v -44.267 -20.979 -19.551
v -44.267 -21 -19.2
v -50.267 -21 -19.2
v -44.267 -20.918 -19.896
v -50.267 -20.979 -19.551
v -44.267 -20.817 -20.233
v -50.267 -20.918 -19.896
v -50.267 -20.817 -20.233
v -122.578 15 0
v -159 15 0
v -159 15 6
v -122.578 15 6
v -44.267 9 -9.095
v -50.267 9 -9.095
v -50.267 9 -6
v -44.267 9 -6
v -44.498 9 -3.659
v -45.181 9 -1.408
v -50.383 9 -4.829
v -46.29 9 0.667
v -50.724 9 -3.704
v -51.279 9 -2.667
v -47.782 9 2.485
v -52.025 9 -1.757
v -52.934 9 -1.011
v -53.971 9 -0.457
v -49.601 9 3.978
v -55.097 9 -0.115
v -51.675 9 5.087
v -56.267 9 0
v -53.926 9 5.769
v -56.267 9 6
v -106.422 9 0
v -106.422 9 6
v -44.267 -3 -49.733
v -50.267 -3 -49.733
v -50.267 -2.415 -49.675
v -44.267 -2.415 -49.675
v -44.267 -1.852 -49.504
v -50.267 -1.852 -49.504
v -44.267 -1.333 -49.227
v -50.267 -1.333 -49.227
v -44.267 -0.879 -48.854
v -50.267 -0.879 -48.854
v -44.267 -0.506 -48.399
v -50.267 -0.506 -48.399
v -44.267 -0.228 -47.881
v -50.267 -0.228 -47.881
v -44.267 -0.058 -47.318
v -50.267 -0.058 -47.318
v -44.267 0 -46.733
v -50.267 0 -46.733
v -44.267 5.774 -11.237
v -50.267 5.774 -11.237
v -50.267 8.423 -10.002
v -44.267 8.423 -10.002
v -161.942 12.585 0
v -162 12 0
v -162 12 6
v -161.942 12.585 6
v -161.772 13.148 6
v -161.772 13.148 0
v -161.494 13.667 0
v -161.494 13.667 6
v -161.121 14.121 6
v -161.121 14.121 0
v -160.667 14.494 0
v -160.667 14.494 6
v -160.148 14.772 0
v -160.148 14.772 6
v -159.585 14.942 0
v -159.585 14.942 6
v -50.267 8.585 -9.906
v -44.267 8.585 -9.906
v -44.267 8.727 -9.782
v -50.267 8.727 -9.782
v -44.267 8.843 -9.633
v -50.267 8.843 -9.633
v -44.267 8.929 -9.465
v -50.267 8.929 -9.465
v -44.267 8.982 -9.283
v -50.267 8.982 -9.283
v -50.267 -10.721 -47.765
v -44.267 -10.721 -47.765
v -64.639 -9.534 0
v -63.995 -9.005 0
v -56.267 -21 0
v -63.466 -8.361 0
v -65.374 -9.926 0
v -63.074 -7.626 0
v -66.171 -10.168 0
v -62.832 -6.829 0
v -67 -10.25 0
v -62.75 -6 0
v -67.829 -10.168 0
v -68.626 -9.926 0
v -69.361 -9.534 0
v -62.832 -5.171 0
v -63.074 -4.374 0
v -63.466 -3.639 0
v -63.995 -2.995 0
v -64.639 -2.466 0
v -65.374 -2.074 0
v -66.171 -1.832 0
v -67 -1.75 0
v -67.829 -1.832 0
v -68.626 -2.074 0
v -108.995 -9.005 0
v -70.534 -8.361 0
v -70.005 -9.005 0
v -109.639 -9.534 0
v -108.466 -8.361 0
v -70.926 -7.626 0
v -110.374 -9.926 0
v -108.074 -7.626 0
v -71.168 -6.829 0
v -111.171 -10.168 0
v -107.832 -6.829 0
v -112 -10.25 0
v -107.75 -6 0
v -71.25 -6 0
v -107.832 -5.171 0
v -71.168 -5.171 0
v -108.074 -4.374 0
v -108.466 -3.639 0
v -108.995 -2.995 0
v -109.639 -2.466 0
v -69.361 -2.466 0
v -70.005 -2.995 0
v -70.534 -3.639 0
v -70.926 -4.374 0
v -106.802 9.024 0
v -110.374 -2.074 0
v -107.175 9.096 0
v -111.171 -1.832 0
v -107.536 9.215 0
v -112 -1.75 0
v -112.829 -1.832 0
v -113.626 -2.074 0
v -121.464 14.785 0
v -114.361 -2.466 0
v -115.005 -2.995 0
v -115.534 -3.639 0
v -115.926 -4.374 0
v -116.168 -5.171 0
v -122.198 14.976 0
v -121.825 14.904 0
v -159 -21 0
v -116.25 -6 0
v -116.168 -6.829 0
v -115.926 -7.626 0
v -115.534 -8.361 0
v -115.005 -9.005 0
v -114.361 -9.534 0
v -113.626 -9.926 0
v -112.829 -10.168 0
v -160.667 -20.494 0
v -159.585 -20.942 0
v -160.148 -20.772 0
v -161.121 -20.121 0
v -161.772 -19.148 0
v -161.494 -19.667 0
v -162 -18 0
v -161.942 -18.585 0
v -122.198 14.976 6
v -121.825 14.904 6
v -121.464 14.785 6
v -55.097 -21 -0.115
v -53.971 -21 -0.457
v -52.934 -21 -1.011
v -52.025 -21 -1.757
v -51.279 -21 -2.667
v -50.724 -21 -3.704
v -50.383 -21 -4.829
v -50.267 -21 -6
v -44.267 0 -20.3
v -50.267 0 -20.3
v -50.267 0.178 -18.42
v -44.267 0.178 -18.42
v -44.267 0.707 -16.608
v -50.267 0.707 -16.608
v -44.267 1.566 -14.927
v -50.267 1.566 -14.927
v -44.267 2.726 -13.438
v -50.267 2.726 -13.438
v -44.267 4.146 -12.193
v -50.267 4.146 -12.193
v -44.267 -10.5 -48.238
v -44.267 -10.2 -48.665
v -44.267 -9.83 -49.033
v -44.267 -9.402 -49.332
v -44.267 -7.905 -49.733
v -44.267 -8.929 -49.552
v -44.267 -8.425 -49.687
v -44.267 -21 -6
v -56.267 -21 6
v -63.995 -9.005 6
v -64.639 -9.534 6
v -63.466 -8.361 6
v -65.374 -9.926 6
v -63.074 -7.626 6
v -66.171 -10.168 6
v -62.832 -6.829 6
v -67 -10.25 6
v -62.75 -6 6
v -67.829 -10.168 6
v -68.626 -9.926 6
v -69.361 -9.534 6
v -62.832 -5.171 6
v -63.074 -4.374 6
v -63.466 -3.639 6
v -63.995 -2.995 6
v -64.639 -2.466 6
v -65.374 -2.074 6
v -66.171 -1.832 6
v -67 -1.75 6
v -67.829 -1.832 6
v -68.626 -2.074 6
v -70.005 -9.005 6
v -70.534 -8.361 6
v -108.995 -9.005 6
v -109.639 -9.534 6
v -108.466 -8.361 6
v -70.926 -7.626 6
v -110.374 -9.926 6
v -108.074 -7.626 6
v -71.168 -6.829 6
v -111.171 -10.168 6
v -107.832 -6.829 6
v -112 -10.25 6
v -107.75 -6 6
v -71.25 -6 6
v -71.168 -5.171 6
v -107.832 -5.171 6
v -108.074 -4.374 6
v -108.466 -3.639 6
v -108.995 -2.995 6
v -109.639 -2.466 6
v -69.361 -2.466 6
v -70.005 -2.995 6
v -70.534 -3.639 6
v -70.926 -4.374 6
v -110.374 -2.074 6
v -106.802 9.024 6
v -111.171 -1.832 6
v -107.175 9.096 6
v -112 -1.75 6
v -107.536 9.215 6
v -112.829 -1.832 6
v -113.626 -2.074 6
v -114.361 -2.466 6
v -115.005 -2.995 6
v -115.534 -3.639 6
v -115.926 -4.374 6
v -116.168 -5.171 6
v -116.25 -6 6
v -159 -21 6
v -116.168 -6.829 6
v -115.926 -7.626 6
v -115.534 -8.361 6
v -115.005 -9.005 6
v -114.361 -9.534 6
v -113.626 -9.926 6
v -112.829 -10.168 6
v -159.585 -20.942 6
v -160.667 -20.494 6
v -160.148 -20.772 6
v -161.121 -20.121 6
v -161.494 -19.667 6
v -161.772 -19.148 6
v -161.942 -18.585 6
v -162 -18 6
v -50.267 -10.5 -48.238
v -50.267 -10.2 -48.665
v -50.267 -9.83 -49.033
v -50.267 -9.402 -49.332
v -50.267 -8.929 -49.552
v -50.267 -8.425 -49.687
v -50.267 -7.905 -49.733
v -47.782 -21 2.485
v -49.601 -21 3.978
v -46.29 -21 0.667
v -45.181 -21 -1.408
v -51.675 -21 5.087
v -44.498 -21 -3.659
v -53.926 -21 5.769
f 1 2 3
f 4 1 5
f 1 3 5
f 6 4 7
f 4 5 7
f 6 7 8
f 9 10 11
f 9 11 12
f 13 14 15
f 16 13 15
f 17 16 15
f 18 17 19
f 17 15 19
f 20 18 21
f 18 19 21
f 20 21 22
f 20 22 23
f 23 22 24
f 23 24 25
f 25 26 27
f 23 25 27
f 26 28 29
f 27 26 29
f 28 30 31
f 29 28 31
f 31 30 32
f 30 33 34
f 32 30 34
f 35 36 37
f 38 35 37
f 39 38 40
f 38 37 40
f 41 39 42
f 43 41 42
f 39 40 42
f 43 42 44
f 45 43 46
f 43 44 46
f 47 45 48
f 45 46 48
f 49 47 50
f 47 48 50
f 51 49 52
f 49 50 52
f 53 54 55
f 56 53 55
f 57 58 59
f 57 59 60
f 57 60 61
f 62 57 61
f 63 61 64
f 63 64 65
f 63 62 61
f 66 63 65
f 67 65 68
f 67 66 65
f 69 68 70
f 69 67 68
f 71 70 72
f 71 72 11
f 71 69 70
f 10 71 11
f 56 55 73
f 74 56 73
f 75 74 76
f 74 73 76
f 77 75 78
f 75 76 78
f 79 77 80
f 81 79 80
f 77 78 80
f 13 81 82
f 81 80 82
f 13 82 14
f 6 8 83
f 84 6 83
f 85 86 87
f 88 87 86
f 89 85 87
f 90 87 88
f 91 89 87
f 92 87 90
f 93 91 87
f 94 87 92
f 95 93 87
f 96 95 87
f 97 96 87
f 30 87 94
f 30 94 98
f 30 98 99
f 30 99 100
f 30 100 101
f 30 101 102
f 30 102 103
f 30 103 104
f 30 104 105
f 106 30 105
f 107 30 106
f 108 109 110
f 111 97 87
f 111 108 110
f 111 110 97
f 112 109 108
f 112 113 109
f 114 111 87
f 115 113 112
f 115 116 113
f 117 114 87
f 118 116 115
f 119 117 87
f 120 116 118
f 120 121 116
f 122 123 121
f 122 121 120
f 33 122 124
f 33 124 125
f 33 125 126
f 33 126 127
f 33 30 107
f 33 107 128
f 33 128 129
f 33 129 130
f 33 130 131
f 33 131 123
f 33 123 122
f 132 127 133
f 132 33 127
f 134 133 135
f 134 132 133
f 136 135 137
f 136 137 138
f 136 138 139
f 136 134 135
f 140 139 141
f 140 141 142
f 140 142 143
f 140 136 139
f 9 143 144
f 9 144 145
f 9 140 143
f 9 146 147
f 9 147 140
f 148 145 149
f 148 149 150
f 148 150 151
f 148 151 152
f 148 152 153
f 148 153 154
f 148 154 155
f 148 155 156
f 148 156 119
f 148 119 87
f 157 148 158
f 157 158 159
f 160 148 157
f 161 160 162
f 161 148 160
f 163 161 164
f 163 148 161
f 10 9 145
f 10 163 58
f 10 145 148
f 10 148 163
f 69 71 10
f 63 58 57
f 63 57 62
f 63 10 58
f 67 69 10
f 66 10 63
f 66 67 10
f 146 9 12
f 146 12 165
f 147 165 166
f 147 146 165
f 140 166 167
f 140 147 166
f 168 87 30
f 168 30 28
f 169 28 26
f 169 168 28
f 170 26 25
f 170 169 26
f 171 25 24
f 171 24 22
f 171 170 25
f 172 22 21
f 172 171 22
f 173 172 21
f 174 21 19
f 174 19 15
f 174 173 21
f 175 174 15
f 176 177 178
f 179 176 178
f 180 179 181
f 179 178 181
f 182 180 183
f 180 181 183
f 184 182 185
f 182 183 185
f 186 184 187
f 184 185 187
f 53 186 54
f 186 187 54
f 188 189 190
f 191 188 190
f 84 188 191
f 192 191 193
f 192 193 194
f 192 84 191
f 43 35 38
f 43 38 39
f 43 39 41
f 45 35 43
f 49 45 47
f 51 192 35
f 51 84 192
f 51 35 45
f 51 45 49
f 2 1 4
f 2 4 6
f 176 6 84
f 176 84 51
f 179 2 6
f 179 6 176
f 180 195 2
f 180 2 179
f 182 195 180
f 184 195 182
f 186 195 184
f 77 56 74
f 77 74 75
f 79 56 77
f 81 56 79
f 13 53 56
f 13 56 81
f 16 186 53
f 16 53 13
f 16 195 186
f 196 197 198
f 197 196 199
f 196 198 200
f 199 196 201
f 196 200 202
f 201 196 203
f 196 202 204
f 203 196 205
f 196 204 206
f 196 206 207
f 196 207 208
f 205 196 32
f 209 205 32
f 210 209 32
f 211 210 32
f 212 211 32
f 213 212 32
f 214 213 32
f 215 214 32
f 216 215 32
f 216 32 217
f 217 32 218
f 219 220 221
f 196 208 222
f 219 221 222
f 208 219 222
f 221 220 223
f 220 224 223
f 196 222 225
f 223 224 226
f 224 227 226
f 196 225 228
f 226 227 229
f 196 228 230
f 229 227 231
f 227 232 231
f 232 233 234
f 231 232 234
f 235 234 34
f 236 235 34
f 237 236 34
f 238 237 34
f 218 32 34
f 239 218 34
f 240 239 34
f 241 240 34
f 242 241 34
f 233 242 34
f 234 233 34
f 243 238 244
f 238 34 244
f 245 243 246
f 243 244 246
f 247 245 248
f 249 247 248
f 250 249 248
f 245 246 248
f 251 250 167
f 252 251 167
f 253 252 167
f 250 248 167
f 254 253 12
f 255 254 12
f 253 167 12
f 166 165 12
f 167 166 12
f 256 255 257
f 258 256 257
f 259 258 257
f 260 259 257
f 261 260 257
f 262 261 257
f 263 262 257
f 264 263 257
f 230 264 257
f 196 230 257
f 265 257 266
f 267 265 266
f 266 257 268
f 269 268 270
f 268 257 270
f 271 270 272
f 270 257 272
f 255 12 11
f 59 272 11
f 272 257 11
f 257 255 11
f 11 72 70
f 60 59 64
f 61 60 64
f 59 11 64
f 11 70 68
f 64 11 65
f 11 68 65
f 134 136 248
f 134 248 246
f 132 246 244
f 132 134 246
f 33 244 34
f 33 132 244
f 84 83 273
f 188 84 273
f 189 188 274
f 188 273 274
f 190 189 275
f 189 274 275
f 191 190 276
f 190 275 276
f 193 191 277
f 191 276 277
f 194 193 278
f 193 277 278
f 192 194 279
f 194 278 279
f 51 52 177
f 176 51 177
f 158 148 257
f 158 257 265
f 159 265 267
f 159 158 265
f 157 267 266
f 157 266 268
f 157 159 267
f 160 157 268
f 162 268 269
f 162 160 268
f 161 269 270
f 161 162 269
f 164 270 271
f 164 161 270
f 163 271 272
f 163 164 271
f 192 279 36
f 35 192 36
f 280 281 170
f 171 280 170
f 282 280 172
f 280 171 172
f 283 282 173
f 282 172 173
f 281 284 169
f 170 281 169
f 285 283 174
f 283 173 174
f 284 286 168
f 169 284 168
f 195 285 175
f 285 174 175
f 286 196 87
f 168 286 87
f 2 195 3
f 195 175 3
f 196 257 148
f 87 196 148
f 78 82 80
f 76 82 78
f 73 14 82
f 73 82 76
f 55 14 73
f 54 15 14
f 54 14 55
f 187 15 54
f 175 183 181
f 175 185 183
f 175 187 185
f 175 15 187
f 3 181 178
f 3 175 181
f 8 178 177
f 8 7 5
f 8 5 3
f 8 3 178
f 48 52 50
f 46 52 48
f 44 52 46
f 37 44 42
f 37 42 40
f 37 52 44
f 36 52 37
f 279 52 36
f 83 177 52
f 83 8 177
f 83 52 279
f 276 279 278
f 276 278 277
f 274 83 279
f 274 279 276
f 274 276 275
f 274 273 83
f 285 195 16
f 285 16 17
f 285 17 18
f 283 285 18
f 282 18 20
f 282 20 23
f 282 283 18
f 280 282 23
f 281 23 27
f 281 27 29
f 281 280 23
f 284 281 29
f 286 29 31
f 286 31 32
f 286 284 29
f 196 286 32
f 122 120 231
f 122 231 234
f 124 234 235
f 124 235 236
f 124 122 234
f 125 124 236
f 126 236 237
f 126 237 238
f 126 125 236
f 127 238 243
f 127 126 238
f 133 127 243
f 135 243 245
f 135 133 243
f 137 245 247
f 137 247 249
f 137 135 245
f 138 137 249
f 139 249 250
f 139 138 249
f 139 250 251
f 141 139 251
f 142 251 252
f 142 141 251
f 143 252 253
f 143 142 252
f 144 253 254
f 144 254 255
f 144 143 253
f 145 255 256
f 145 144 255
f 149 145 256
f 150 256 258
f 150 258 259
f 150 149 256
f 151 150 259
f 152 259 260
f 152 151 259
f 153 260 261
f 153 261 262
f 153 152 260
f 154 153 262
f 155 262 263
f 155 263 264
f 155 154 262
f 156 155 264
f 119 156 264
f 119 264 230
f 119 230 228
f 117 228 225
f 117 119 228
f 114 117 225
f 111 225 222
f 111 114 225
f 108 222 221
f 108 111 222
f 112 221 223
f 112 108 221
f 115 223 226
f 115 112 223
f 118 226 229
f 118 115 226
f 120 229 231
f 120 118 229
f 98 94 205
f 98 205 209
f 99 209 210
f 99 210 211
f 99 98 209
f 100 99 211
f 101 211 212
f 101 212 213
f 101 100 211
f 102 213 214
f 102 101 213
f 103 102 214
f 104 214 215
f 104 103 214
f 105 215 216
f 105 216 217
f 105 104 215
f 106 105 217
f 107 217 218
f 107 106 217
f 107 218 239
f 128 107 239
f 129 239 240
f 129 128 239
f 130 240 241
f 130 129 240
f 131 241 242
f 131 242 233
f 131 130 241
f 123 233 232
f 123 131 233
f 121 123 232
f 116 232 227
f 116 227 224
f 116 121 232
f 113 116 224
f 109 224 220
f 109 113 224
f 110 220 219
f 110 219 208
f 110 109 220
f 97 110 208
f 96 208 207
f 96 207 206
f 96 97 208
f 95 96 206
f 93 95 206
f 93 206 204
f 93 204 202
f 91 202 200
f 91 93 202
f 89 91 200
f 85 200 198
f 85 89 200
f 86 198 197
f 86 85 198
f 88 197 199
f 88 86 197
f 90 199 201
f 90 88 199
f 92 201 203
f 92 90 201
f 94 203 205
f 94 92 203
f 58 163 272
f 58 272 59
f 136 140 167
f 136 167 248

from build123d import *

# Parameters (mm, degrees)
SKETCH1_R                = 4.25
EXTRUDE1_DEPTH           = 6
PROCESS_BENDS1_START     = -45.500357344
PROCESS_BENDS1_OUTLINE_W = 30
PROCESS_BENDS1_OUTLINE_H = 6
PROCESS_BENDS1_DEPTH     = 45.500357344
PROCESS_BENDS1_START_2   = -50.267477344
PROCESS_BENDS1_2_DEPTH   = 4.83288
PROCESS_BENDS1_START_3   = -56.267477344
PROCESS_BENDS1_3_DEPTH   = 6
PROCESS_BENDS1_START_4   = -45.434597344
PROCESS_BENDS1_4_DEPTH   = 1.16712
PROCESS_BENDS1_START_5   = -21
PROCESS_BENDS1_5_DEPTH   = 30


with BuildPart() as part:
    # Sketch1 → Extrude1 (new body)
    with BuildSketch(Plane.XY):
        with BuildLine():
            Line((-106.422252789, 9), (-40.637070261, 9))
            ThreePointArc((-40.637070261, 9), (-40.099770652, 8.843391446), (-39.730762474, 8.422618262))
            Line((-39.730762474, 8.422618262), (-38.495606339, 5.773817383))
            ThreePointArc((-38.495606339, 5.773817383), (-34.805524552, 1.566085542), (-29.432528469, 0))
            Line((-29.432528469, 0), (-3, 0))
            ThreePointArc((-3, 0), (-0.878679656, -0.878679656), (0, -3))
            Line((0, -3), (0, -7.904690938))
            ThreePointArc((0, -7.904690938), (-0.540498847, -9.622495956), (-1.967236053, -10.721319886))
            Line((-1.967236053, -10.721319886), (-29.49989713, -20.816628948))
            ThreePointArc((-29.49989713, -20.816628948), (-30.008202711, -20.95380152), (-30.532661077, -21))
            Line((-30.532661077, -21), (-159, -21))
            ThreePointArc((-159, -21), (-161.121320344, -20.121320344), (-162, -18))
            Line((-162, -18), (-162, 12))
            ThreePointArc((-162, 12), (-161.121320344, 14.121320344), (-159, 15))
            Line((-159, 15), (-122.577747211, 15))
            ThreePointArc((-122.577747211, 15), (-122.010424647, 14.94586916), (-121.463575182, 14.785430073))
            Line((-121.463575182, 14.785430073), (-107.536424818, 9.214569927))
            ThreePointArc((-107.536424818, 9.214569927), (-106.989575353, 9.05413084), (-106.422252789, 9))
        make_face()
        with Locations((-67, -6)):
            Circle(SKETCH1_R, mode=Mode.SUBTRACT)
        with Locations((-112, -6)):
            Circle(SKETCH1_R, mode=Mode.SUBTRACT)
    extrude(amount=EXTRUDE1_DEPTH)

    # Process-Bends1: read off the stored shape, not the designer's step
    # Process-Bends1 outline → Process-Bends1 (cut)
    with BuildSketch(Plane.YZ.offset(PROCESS_BENDS1_START)):
        with Locations((-6, 3)):
            Rectangle(PROCESS_BENDS1_OUTLINE_W, PROCESS_BENDS1_OUTLINE_H)
    extrude(amount=PROCESS_BENDS1_DEPTH, mode=Mode.SUBTRACT)

    # Process-Bends1 2 outline → Process-Bends1 2 (add)
    with BuildSketch(Plane.YZ.offset(PROCESS_BENDS1_START_2)):
        with BuildLine():
            Line((5.773817383, -11.236916317), (8.422618262, -10.001760182))
            ThreePointArc((8.422618262, -10.001760182), (8.843391446, -9.632752004), (9, -9.095452395))
            Line((9, -9.095452395), (9, 0))
            Line((9, 0), (-21, 0))
            Line((-21, 0), (-21, -19.199861579))
            ThreePointArc((-21, -19.199861579), (-20.95380152, -19.724319945), (-20.816628948, -20.232625526))
            Line((-20.816628948, -20.232625526), (-10.721319886, -47.765286604))
            ThreePointArc((-10.721319886, -47.765286604), (-9.622495956, -49.192023809), (-7.904690938, -49.732522656))
            Line((-7.904690938, -49.732522656), (-3, -49.732522656))
            ThreePointArc((-3, -49.732522656), (-0.878679656, -48.853843), (0, -46.732522656))
            Line((0, -46.732522656), (0, -20.299994188))
            ThreePointArc((0, -20.299994188), (1.566085542, -14.926998104), (5.773817383, -11.236916317))
        make_face()
    extrude(amount=PROCESS_BENDS1_2_DEPTH)

    # Process-Bends1 3 outline → Process-Bends1 3 (add)
    with BuildSketch(Plane.YZ.offset(PROCESS_BENDS1_START_3)):
        with BuildLine():
            Line((5.773817383, -11.236916317), (8.422618262, -10.001760182))
            ThreePointArc((8.422618262, -10.001760182), (8.843391446, -9.632752004), (9, -9.095452395))
            Line((9, -9.095452395), (9, 0))
            Line((9, 0), (-21, 0))
            Line((-21, 0), (-21, -19.199861579))
            ThreePointArc((-21, -19.199861579), (-20.95380152, -19.724319945), (-20.816628948, -20.232625526))
            Line((-20.816628948, -20.232625526), (-10.721319886, -47.765286604))
            ThreePointArc((-10.721319886, -47.765286604), (-9.622495956, -49.192023809), (-7.904690938, -49.732522656))
            Line((-7.904690938, -49.732522656), (-3, -49.732522656))
            ThreePointArc((-3, -49.732522656), (-0.878679656, -48.853843), (0, -46.732522656))
            Line((0, -46.732522656), (0, -20.299994188))
            ThreePointArc((0, -20.299994188), (1.566085542, -14.926998104), (5.773817383, -11.236916317))
        make_face()
    extrude(amount=PROCESS_BENDS1_3_DEPTH)

    # Process-Bends1 4 outline → Process-Bends1 4 (add)
    with BuildSketch(Plane.YZ.offset(PROCESS_BENDS1_START_4)):
        with BuildLine():
            Line((5.773817383, -11.236916317), (8.422618262, -10.001760182))
            ThreePointArc((8.422618262, -10.001760182), (8.843391446, -9.632752004), (9, -9.095452395))
            Line((9, -9.095452395), (9, 0))
            Line((9, 0), (-21, 0))
            Line((-21, 0), (-21, -19.199861579))
            ThreePointArc((-21, -19.199861579), (-20.95380152, -19.724319945), (-20.816628948, -20.232625526))
            Line((-20.816628948, -20.232625526), (-10.721319886, -47.765286604))
            ThreePointArc((-10.721319886, -47.765286604), (-9.622495956, -49.192023809), (-7.904690938, -49.732522656))
            Line((-7.904690938, -49.732522656), (-3, -49.732522656))
            ThreePointArc((-3, -49.732522656), (-0.878679656, -48.853843), (0, -46.732522656))
            Line((0, -46.732522656), (0, -20.299994188))
            ThreePointArc((0, -20.299994188), (1.566085542, -14.926998104), (5.773817383, -11.236916317))
        make_face()
    extrude(amount=PROCESS_BENDS1_4_DEPTH)

    # Process-Bends1 5 outline → Process-Bends1 5 (cut)
    with BuildSketch(Plane(origin=(0, 0, 0), x_dir=(1, 0, 0), z_dir=(0, 1, 0)).offset(PROCESS_BENDS1_START_5)):
        with BuildLine():
            Line((-50.267477344, 6), (-50.267477344, 49.732522656))
            Line((-50.267477344, 49.732522656), (-56.267477344, 49.732522656))
            Line((-56.267477344, 49.732522656), (-56.267477344, 0))
            ThreePointArc((-56.267477344, 0), (-52.024836657, 1.757359313), (-50.267477344, 6))
        make_face()
        with BuildLine():
            Line((-44.267477344, 0), (-44.267477344, 6))
            ThreePointArc((-44.267477344, 6), (-47.78219597, -2.485281374), (-56.267477344, -6))
            Line((-56.267477344, -6), (-45.500357344, -6))
            Line((-45.500357344, -6), (-45.500357344, 0))
            Line((-45.500357344, 0), (-44.267477344, 0))
        make_face()
    extrude(amount=PROCESS_BENDS1_5_DEPTH, mode=Mode.SUBTRACT)


solid = part.part
